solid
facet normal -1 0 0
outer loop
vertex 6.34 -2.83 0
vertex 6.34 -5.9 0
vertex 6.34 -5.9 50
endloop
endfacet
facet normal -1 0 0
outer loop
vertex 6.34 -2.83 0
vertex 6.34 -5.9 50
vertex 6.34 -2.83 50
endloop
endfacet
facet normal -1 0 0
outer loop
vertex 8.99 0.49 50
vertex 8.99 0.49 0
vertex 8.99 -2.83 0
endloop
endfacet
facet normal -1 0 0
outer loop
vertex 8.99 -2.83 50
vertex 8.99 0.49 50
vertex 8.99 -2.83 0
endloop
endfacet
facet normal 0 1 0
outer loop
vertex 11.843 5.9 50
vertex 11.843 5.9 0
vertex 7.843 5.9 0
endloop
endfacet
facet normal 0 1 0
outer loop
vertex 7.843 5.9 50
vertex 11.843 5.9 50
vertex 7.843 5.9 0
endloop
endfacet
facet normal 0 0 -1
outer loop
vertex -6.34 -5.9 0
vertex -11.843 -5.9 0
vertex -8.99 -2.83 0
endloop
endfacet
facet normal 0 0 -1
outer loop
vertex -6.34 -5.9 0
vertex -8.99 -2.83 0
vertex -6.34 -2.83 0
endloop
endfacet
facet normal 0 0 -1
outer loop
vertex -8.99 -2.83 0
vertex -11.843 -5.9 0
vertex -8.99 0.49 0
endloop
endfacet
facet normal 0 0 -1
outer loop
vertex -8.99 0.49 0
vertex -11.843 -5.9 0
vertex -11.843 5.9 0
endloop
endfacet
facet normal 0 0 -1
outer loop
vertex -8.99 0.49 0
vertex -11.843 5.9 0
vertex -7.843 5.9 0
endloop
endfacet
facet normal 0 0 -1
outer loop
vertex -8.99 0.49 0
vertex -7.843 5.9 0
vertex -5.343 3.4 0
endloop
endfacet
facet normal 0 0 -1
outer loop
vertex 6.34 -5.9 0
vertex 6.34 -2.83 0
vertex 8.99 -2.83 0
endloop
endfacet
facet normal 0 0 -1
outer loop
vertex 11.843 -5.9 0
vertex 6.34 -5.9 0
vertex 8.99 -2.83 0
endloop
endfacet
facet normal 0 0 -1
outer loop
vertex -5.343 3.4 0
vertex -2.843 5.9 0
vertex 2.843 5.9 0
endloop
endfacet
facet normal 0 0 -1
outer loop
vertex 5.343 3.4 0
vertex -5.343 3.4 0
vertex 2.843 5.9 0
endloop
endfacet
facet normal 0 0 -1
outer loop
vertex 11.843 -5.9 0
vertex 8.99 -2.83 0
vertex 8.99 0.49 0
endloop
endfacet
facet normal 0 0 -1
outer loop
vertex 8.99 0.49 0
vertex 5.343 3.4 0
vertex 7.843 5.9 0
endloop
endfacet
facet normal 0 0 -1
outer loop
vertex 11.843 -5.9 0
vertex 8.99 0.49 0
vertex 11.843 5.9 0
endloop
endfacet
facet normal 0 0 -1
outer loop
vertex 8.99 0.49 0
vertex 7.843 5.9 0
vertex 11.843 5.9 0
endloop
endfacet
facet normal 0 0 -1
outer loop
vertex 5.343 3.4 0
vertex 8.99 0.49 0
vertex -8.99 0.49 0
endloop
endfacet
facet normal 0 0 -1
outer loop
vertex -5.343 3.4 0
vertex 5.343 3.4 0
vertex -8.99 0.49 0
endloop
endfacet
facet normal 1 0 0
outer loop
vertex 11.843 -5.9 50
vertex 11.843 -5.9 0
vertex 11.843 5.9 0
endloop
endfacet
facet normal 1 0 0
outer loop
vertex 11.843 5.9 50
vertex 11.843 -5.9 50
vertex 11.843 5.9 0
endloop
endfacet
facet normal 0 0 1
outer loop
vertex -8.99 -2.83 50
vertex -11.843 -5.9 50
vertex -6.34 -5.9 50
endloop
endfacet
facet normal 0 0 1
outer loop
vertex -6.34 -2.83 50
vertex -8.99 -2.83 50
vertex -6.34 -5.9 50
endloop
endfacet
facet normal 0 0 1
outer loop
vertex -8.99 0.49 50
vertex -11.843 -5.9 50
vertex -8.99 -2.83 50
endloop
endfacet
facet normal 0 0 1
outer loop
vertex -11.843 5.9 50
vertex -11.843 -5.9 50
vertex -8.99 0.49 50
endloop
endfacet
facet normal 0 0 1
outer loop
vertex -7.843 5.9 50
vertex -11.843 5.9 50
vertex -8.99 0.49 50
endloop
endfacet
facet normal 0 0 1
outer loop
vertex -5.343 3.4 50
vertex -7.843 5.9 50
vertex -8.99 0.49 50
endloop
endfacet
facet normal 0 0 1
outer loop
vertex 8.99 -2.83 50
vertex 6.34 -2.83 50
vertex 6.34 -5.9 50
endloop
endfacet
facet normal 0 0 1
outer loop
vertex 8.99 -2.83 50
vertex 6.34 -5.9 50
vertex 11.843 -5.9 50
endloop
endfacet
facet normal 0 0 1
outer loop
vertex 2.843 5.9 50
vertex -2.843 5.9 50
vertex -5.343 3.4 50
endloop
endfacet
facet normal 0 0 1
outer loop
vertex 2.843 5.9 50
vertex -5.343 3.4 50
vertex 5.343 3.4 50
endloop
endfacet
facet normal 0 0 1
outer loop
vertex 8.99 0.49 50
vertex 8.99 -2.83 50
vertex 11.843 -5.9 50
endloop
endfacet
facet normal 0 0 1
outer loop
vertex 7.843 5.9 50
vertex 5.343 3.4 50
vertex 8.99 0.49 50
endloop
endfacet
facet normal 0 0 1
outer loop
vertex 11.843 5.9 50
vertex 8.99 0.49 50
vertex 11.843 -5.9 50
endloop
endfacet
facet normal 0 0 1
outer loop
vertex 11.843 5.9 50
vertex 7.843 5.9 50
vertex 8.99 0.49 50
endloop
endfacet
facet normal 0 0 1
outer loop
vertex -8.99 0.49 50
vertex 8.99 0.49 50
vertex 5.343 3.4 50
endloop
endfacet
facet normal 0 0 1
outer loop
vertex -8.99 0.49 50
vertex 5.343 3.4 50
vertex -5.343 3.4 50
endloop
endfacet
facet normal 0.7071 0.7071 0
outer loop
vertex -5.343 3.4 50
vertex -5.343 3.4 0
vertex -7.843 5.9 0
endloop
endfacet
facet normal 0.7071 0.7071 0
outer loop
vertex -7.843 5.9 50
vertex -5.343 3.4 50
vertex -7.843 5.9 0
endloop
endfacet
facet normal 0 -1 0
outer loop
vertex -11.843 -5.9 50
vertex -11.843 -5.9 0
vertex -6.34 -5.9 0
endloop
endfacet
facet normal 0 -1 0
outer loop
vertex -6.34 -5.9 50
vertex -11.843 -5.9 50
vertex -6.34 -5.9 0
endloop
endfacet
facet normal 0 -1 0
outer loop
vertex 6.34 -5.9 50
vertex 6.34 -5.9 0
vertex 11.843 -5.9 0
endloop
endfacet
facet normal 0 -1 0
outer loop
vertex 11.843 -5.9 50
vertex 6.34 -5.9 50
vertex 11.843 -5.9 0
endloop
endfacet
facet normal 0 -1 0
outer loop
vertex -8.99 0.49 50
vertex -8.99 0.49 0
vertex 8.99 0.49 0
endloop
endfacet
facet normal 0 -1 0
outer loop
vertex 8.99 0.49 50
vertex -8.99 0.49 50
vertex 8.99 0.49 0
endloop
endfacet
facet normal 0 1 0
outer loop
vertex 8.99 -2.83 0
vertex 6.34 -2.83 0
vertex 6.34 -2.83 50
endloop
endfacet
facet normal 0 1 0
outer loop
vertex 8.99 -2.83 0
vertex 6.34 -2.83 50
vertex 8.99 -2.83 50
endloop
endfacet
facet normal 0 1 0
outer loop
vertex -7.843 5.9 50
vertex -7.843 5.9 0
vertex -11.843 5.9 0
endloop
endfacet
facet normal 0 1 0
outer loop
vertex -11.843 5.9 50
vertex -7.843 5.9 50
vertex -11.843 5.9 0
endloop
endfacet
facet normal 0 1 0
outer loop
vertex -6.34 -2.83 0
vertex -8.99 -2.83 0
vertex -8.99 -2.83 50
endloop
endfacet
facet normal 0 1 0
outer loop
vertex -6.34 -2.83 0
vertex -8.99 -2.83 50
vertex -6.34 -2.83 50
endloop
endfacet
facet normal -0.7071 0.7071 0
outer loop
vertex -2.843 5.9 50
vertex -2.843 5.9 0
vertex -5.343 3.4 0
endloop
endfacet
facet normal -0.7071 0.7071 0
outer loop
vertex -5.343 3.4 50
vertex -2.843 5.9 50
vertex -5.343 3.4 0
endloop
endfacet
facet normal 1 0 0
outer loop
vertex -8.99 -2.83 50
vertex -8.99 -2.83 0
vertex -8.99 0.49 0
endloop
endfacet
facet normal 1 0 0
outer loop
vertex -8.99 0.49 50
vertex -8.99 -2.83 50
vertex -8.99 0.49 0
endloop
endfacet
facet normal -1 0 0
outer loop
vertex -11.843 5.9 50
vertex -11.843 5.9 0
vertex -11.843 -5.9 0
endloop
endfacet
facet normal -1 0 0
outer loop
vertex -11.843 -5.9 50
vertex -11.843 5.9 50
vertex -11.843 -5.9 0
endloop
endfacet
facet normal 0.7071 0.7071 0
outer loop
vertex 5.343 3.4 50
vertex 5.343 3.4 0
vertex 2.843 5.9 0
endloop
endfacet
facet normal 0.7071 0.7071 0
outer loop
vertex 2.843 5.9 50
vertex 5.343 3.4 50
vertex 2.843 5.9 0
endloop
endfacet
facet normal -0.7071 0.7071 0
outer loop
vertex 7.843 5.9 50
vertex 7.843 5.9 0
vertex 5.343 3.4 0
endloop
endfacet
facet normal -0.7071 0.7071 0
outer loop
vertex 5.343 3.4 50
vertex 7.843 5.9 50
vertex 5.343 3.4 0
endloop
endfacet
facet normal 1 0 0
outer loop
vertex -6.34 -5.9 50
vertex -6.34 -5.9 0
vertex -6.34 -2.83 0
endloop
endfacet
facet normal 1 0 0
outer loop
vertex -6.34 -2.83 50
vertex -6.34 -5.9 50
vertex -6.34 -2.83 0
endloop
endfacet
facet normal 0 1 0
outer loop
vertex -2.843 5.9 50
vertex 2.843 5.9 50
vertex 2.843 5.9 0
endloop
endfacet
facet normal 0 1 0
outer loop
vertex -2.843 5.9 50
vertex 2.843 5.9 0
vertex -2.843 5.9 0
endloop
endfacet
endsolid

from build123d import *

# Parameters (mm, degrees)
F0_W     = 2.65
F0_H     = 3.07
F1_DEPTH = 50


with BuildPart() as f1:
    # F0 (on Top) → F1 (new body)
    with BuildSketch(Plane.XY):
        Polygon((-8.99, 0.489908), (-11.843405, 0.489908), (-11.843405, -5.900092), (-8.99, -5.900092), (-8.99, -2.830092), align=None)
        Polygon((-7.843405, 5.900092), (-11.843405, 5.900092), (-11.843405, 0.489908), (-8.99, 0.489908), (8.99, 0.489908), (11.843405, 0.489908), (11.843405, 5.900092), (7.843405, 5.900092), (5.343405, 3.400092), (2.843405, 5.900092), (-2.843405, 5.900092), (-5.343405, 3.400092), align=None)
        Polygon((11.843405, 0.489908), (8.99, 0.489908), (8.99, -2.830092), (8.99, -5.900092), (11.843405, -5.900092), align=None)
        with Locations((7.665, -4.365092)):
            Rectangle(F0_W, F0_H)
        with Locations((-7.665, -4.365092)):
            Rectangle(F0_W, F0_H)
    extrude(amount=F1_DEPTH)


solid = f1.part
